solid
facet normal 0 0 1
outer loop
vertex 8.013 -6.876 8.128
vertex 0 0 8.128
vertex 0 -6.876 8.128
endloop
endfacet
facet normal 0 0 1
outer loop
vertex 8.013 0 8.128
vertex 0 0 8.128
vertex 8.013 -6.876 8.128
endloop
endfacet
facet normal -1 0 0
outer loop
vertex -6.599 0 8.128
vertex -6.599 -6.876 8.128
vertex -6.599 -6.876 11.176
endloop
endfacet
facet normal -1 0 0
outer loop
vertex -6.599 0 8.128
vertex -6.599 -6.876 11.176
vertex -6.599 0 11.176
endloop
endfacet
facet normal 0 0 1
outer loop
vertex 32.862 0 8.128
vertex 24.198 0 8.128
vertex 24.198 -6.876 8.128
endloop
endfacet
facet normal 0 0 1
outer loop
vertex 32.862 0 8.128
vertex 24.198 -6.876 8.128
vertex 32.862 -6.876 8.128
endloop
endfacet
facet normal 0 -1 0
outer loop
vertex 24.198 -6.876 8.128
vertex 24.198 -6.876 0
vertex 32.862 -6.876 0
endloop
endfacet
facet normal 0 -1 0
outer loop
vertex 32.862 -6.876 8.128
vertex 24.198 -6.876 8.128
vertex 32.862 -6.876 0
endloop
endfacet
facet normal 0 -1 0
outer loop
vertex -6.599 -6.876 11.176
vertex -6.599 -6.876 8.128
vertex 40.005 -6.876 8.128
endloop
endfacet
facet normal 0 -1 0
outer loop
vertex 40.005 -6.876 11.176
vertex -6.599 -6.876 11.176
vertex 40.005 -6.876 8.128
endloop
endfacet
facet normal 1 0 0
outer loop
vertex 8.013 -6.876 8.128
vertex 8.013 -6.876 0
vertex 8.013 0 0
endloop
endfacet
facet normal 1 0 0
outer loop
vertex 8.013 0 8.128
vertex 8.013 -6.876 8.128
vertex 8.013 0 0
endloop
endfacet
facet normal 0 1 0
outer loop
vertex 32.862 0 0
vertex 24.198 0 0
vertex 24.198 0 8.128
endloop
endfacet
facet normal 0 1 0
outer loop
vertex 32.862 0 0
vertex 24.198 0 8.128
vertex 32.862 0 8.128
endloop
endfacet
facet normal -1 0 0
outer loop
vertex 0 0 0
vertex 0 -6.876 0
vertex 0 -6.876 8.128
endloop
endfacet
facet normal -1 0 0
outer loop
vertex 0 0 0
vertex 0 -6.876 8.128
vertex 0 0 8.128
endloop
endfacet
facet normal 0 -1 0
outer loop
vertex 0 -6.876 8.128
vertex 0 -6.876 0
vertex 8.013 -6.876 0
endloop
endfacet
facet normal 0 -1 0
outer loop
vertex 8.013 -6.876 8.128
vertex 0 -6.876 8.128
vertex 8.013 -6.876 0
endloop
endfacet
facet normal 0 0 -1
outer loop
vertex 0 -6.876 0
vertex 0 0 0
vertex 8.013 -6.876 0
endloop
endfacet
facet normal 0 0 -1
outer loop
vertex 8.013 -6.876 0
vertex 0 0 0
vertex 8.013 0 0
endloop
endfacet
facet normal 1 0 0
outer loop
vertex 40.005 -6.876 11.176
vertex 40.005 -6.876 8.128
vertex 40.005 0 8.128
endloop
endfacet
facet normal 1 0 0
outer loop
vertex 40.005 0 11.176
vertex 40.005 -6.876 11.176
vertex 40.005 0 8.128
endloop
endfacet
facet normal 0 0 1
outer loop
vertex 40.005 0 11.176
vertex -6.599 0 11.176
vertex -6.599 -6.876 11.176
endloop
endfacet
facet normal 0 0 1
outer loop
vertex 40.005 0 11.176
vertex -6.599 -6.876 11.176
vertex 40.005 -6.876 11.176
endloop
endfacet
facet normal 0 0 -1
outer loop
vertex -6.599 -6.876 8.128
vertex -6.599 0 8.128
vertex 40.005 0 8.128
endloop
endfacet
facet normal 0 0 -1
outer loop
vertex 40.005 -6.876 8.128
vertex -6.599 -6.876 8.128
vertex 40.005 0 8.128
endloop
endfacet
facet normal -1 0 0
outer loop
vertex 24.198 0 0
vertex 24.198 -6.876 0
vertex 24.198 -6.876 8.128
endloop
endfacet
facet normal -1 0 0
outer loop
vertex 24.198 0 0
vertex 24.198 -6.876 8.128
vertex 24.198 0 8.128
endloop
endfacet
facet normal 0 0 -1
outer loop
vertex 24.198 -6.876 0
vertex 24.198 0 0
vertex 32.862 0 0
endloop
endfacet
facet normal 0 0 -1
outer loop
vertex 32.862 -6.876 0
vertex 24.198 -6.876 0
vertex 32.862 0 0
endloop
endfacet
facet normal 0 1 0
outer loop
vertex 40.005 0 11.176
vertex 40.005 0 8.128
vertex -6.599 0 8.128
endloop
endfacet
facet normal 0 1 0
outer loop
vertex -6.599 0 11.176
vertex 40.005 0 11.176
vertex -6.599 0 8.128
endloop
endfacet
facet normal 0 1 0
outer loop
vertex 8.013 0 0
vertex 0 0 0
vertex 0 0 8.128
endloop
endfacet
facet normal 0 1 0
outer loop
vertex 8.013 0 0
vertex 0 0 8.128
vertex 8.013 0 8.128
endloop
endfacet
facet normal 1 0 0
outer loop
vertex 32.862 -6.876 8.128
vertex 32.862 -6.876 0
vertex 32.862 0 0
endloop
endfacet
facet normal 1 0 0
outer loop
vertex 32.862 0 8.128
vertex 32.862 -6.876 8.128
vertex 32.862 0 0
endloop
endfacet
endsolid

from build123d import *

# Parameters (mm, degrees)
F0_W     = 8.0131450668
F0_H     = 6.8762861192
F1_DEPTH = 8.128
F0_W_2   = 8.6642354727
F2_W     = 6.5987631679
F2_H     = 6.8762861192
F2_W_2   = 31.9918533787
F2_W_3   = 8.0131450668
F3_DEPTH = 3.048


with BuildPart() as f1:
    # F0 (on Top) → F1 (new body)
    with BuildSketch(Plane.XY):
        with Locations((4.0065725334, -3.4381430596)):
            Rectangle(F0_W, F0_H)
    extrude(amount=F1_DEPTH)


with BuildPart() as f1b:
    # F0 (on Top) → F1, piece 2 (new body)
    with BuildSketch(Plane.XY):
        with Locations((28.5298973322, -3.4381430596)):
            Rectangle(F0_W_2, F0_H)
    extrude(amount=F1_DEPTH)


with BuildPart() as f3:
    # F2 (on face) → F3 (new body)
    with BuildSketch(Plane.XY.offset(8.128)):
        with Locations((-3.2993815839, -3.4381430596)):
            Rectangle(F2_W, F2_H)
        with Locations((24.0090717562, -3.4381430596)):
            Rectangle(F2_W_2, F2_H)
        with Locations((4.0065725334, -3.4381430596)):
            Rectangle(F2_W_3, F2_H)
    extrude(amount=F3_DEPTH)


solid = Compound([f1.part, f1b.part, f3.part])
